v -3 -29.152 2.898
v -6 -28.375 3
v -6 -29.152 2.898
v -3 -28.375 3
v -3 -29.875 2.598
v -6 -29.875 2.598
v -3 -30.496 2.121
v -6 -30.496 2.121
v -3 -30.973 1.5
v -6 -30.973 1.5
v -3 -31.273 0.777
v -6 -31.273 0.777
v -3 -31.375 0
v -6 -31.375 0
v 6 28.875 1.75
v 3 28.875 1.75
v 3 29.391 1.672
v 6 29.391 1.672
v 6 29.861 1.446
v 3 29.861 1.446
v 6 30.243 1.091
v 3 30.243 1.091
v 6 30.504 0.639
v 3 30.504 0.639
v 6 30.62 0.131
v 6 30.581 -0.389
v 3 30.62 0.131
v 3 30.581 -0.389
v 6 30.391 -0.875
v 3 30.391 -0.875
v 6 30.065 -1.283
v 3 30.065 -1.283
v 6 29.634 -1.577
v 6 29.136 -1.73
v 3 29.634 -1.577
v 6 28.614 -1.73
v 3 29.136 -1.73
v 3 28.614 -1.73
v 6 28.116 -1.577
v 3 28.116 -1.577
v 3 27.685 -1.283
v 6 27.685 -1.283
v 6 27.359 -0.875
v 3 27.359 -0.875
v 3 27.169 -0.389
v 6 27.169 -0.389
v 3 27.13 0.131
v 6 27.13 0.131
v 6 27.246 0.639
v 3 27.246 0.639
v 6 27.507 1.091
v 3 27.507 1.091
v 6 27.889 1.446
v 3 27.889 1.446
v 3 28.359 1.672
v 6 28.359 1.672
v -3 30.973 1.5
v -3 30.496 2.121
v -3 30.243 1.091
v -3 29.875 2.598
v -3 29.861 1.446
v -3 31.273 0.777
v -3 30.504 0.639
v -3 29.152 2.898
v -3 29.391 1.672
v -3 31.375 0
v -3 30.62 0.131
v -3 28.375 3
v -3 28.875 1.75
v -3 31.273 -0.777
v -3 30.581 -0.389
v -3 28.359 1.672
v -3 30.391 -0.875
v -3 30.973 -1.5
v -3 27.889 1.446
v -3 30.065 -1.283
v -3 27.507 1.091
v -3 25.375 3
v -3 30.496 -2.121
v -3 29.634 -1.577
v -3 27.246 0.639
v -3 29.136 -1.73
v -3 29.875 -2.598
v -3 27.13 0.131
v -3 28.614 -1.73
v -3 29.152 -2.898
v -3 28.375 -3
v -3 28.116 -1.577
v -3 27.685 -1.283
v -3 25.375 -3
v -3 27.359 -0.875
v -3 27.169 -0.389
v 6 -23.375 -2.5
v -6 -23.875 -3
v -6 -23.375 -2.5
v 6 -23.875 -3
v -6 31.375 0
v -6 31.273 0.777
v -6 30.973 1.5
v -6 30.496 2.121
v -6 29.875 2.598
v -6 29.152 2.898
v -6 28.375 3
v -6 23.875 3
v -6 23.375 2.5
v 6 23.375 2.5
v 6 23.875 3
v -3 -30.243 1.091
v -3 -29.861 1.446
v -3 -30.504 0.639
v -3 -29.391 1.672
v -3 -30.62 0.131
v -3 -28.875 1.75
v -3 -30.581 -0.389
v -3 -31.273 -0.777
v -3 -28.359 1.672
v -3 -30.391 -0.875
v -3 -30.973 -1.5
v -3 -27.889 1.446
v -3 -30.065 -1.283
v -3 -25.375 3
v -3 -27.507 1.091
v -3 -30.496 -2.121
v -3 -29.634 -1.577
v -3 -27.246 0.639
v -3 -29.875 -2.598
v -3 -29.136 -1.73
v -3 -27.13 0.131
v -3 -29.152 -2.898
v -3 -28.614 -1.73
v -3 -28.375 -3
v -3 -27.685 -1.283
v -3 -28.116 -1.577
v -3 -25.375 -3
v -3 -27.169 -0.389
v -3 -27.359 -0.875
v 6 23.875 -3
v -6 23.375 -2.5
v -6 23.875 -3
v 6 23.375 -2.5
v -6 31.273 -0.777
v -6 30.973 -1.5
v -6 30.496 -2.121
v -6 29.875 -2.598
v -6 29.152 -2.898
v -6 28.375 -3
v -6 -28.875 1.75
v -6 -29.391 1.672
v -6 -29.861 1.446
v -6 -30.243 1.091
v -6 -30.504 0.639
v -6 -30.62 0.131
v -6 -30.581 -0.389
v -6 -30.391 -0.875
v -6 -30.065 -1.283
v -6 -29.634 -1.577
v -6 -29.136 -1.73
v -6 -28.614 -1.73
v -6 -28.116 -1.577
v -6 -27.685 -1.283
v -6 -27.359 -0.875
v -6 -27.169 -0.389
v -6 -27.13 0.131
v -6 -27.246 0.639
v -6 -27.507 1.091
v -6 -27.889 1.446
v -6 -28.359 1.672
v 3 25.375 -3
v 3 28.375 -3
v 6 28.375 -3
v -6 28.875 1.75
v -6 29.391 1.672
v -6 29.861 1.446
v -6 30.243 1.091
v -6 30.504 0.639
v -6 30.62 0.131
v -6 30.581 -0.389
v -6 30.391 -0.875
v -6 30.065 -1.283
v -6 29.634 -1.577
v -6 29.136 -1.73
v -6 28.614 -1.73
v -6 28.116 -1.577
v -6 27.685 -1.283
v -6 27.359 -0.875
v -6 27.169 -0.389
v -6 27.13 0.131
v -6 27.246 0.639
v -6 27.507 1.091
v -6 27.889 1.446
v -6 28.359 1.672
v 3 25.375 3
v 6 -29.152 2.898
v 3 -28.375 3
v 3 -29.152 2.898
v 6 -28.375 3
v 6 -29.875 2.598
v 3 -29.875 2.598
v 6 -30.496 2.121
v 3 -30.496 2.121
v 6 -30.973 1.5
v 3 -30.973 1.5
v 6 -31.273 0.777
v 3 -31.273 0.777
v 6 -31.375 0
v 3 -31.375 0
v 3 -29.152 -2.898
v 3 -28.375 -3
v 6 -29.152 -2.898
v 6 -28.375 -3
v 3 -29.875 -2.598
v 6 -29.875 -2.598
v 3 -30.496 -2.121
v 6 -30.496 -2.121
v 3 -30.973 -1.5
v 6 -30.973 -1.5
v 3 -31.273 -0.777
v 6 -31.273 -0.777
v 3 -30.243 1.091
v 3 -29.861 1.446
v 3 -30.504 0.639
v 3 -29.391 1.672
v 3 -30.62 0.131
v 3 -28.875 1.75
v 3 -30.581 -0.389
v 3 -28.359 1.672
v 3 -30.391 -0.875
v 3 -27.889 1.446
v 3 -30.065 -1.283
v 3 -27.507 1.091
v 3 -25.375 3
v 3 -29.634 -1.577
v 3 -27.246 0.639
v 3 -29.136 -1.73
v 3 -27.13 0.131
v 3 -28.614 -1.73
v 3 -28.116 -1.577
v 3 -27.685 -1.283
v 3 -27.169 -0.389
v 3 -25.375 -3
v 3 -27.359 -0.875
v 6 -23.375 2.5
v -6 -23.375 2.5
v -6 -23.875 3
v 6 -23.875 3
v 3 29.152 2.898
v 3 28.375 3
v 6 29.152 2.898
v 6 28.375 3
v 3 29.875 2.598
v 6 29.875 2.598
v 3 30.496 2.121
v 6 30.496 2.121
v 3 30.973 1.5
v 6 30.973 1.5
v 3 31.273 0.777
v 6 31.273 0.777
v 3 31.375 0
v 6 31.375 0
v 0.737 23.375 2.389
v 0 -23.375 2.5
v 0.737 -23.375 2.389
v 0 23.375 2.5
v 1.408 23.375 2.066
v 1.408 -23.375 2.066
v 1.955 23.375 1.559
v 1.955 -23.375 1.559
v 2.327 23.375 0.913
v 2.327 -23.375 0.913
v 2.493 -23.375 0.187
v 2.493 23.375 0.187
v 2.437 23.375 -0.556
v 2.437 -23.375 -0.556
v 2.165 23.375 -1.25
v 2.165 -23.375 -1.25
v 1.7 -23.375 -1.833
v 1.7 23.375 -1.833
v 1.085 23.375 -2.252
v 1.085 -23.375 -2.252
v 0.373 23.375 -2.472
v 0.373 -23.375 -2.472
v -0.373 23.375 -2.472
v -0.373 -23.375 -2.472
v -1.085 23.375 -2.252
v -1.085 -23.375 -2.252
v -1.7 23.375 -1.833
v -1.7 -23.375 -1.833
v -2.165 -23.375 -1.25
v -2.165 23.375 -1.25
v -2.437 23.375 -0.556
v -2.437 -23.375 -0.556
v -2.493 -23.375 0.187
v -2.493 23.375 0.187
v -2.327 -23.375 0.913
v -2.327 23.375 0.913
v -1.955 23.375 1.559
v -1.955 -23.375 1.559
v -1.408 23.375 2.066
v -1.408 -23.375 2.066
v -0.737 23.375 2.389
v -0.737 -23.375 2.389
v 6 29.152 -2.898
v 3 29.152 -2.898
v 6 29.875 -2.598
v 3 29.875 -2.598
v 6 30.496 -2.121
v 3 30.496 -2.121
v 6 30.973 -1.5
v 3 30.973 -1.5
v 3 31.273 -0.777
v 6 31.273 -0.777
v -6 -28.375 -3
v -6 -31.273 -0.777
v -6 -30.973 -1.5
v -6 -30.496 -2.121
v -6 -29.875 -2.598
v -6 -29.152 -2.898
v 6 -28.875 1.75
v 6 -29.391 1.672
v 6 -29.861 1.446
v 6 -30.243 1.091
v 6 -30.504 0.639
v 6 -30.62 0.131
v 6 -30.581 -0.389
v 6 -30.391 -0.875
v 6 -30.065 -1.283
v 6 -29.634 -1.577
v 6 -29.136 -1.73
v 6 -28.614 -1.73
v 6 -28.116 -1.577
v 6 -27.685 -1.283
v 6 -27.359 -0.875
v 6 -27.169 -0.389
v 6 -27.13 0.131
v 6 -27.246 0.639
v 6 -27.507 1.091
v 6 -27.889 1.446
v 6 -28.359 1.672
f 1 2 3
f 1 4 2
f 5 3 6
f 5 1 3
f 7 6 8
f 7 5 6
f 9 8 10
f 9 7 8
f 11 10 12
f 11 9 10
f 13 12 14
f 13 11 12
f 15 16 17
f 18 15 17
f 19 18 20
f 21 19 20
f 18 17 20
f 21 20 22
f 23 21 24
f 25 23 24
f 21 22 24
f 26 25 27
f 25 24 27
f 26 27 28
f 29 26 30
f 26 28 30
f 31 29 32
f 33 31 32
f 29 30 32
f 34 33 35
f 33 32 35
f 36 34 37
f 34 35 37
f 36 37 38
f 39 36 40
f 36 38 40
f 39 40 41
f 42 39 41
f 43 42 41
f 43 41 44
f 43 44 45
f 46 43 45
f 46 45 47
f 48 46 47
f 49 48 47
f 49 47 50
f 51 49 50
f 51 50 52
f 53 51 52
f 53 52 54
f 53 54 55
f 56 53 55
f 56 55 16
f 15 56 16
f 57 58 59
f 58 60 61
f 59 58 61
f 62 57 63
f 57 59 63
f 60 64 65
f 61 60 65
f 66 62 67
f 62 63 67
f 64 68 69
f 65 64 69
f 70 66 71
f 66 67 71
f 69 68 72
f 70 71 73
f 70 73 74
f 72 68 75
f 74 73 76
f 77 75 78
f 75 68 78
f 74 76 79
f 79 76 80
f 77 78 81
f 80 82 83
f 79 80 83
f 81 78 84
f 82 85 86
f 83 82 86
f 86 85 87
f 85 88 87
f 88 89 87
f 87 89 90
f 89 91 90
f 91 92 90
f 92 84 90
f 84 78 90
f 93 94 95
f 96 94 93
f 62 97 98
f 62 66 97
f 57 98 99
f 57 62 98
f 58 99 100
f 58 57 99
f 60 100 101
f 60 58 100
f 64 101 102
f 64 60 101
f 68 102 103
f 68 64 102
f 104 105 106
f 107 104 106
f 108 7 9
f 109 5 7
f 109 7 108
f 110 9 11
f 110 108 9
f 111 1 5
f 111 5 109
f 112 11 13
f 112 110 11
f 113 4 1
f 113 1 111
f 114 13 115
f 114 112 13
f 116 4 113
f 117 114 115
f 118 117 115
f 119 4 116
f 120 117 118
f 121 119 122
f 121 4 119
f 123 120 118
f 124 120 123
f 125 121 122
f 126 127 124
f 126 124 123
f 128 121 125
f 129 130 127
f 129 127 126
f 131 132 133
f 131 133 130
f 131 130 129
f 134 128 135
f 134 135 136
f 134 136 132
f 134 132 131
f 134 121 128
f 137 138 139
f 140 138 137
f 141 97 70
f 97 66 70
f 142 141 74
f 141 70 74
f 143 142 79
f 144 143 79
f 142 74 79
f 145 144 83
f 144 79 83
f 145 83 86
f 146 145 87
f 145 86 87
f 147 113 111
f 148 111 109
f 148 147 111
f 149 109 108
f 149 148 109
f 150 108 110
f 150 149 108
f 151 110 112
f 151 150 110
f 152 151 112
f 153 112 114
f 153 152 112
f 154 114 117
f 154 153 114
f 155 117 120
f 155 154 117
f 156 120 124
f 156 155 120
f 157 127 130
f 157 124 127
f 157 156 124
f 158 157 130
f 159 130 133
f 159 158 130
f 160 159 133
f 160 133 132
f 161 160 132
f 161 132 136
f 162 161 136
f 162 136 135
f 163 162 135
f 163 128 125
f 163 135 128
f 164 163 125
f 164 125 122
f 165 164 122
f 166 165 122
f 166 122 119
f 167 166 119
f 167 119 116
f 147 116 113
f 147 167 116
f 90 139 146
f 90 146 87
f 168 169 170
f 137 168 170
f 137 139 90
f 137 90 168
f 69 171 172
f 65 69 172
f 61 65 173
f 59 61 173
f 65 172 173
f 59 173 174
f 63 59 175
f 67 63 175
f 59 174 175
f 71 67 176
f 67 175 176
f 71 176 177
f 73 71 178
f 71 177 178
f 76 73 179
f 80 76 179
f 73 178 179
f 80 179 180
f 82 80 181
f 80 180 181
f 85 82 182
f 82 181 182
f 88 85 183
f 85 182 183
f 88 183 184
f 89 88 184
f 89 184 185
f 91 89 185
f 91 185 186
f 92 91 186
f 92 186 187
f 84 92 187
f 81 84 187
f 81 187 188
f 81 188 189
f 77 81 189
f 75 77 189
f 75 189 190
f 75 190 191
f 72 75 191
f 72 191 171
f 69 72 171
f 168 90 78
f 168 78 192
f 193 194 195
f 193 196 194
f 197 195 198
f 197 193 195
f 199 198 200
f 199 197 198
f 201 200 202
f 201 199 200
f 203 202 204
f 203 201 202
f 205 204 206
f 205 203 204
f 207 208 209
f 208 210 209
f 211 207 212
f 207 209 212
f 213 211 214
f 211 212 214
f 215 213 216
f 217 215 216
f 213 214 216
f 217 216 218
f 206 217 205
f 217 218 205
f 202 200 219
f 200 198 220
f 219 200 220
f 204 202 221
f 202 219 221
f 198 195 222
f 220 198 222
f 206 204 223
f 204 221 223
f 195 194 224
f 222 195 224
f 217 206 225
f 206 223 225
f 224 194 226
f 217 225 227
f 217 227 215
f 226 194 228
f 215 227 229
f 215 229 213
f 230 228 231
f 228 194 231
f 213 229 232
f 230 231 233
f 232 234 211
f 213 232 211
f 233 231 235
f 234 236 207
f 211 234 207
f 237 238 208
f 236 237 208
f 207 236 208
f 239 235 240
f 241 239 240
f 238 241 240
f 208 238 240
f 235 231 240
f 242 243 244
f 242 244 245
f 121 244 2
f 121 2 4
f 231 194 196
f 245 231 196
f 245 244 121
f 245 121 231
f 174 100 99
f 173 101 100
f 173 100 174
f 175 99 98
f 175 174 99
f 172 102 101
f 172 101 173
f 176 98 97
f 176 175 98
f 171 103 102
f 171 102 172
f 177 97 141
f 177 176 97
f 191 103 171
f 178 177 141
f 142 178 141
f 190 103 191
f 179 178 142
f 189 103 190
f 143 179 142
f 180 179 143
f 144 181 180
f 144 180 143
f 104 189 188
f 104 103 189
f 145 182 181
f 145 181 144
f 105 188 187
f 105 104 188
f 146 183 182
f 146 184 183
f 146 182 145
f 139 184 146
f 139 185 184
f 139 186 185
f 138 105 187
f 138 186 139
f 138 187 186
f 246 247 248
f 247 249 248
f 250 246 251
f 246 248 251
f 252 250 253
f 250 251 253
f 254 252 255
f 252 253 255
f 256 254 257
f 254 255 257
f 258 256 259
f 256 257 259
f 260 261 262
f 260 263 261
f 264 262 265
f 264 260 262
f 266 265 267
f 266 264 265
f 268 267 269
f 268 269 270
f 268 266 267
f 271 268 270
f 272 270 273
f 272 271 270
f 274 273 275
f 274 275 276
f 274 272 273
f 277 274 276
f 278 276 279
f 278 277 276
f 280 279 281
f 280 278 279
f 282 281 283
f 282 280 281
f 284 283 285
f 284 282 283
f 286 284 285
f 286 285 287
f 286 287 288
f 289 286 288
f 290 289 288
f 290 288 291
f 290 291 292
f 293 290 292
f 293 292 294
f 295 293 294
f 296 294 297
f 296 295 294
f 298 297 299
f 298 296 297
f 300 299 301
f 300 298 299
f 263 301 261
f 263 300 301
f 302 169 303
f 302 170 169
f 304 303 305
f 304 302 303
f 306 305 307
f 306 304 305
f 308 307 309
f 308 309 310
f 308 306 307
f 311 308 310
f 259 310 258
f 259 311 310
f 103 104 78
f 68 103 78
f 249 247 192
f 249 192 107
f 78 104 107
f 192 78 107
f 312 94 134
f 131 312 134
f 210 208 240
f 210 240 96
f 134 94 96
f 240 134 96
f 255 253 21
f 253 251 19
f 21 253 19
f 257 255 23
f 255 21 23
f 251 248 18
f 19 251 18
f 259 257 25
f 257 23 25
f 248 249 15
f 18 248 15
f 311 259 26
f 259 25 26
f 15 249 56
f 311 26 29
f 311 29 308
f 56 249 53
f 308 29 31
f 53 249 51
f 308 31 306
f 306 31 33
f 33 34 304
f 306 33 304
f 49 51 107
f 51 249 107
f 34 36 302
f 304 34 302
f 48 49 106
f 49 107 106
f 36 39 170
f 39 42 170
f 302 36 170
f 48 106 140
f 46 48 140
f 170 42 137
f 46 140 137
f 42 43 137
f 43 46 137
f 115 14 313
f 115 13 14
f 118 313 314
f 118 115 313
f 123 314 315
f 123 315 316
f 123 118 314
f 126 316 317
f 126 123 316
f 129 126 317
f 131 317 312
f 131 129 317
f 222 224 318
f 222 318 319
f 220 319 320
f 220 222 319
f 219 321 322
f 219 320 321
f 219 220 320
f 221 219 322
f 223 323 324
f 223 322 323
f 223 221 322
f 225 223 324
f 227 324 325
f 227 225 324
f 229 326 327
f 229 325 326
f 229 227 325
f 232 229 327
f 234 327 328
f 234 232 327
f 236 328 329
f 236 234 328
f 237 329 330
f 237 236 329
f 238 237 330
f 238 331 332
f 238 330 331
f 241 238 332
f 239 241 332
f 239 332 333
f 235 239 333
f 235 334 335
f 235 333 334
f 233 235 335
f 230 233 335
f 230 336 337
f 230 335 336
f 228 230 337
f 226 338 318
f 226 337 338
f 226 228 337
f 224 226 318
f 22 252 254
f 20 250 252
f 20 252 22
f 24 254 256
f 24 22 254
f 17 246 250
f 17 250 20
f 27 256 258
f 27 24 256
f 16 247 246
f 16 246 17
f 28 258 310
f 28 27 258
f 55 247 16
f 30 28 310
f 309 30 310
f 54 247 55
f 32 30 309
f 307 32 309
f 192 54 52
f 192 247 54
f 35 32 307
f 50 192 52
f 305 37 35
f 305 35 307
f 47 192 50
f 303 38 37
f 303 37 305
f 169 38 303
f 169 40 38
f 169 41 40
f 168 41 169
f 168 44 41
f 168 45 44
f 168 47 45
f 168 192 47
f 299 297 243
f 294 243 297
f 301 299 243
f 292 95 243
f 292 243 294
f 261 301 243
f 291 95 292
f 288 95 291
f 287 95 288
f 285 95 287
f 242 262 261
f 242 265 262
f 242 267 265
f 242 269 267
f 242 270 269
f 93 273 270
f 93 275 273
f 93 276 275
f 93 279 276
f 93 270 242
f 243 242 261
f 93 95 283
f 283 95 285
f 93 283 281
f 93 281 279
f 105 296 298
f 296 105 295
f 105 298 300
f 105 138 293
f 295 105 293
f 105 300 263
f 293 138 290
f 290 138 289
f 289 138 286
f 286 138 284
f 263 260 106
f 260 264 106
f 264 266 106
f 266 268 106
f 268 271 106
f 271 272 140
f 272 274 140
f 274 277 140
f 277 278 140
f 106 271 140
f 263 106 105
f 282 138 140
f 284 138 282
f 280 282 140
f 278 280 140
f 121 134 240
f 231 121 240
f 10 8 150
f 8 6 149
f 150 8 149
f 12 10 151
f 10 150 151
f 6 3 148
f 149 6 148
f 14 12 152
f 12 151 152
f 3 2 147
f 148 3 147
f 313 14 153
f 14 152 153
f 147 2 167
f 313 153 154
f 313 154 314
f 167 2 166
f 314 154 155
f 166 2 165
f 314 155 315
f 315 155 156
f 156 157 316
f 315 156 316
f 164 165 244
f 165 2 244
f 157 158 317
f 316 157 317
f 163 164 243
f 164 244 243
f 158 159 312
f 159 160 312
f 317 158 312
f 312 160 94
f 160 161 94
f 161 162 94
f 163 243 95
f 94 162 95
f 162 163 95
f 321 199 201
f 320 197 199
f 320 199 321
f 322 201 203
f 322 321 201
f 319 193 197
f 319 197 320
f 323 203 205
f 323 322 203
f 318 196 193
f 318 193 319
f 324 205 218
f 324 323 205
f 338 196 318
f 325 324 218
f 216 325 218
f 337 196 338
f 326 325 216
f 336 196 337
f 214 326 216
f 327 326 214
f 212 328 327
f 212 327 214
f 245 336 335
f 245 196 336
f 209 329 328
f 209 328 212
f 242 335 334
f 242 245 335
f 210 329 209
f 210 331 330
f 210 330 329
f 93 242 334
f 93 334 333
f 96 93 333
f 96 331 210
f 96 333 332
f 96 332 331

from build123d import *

# Parameters (mm, degrees)
SKETCH1_R                = 2.5
BOSS_EXTRUDE1_DEPTH      = 23.375
SKETCH2_W                = 12
SKETCH2_H                = 6
BOSS_EXTRUDE2_DEPTH      = 2
SKETCH3_W                = 3
SKETCH3_H                = 6
BOSS_EXTRUDE3_DEPTH      = 6
SKETCH4_R                = 1.75
CUT_EXTRUDE1_DEPTH       = 34.725222386
FILLET1_R                = 3
CHAMFER2_SIZE            = 0.5
FILLET1_OF_MIRROR1_R     = 3
CHAMFER2_OF_MIRROR1_SIZE = 0.5


with BuildPart() as part:
    # Sketch1 → Boss-Extrude1 (new, symmetric)
    with BuildSketch(Plane(origin=(0, 0, 0), x_dir=(1, 0, 0), z_dir=(0, 1, 0))):
        with Locations(Location((0, 0, 0), (0, 0, 270))):
            Circle(SKETCH1_R)
    extrude(amount=BOSS_EXTRUDE1_DEPTH, both=True)

    # Sketch2 → Boss-Extrude2 (add)
    with BuildSketch(Plane(origin=(0, 23.375, 0), x_dir=(1, 0, 0), z_dir=(0, 1, 0))):
        Rectangle(SKETCH2_W, SKETCH2_H)
    boss_extrude2 = extrude(amount=BOSS_EXTRUDE2_DEPTH)

    # Sketch3 → Boss-Extrude3 (add)
    with BuildSketch(Plane(origin=(0, 25.375, 0), x_dir=(1, 0, 0), z_dir=(0, 1, 0))):
        with Locations((-4.5, 0)):
            Rectangle(SKETCH3_W, SKETCH3_H)
        with Locations((4.5, 0)):
            Rectangle(SKETCH3_W, SKETCH3_H)
    boss_extrude3 = extrude(amount=BOSS_EXTRUDE3_DEPTH)

    # Sketch4 → Cut-Extrude1 (cut, through all)
    with BuildSketch(Plane.ZY.offset(6)):
        with Locations((0, 28.875)):
            Circle(SKETCH4_R)
    cut_extrude1 = extrude(amount=-CUT_EXTRUDE1_DEPTH, mode=Mode.SUBTRACT)

    # Fillet1
    fillet1_edges = [part.edges().sort_by_distance(p)[0] for p in [
        (4.5, 31.375, 3),
        (4.5, 31.375, -3),
        (-4.5, 31.375, 3),
        (-4.5, 31.375, -3),
    ]]
    fillet(fillet1_edges, radius=FILLET1_R - 0.0001)  # a hair under: the kernel refuses the full size

    # Chamfer2
    chamfer2_edges = [part.edges().sort_by_distance(p)[0] for p in [
        (0, 23.375, -3),
        (0, 23.375, 3),
    ]]
    chamfer(chamfer2_edges, length=CHAMFER2_SIZE - 0.0001)  # a hair under: the kernel refuses the full size

    # Mirror1: Boss-Extrude2, Boss-Extrude3, Cut-Extrude1 across plane
    add(boss_extrude2.mirror(Plane.ZX))
    add(boss_extrude3.mirror(Plane.ZX))
    add(cut_extrude1.mirror(Plane.ZX), mode=Mode.SUBTRACT)

    # Fillet1 of Mirror1
    fillet1_of_mirror1_edges = [part.edges().sort_by_distance(p)[0] for p in [
        (4.5, -31.375, 3),
        (4.5, -31.375, -3),
        (-4.5, -31.375, 3),
        (-4.5, -31.375, -3),
    ]]
    fillet(fillet1_of_mirror1_edges, radius=FILLET1_OF_MIRROR1_R - 0.0001)  # a hair under: the kernel refuses the full size

    # Chamfer2 of Mirror1
    chamfer2_of_mirror1_edges = [part.edges().sort_by_distance(p)[0] for p in [
        (0, -23.375, -3),
        (0, -23.375, 3),
    ]]
    chamfer(chamfer2_of_mirror1_edges, length=CHAMFER2_OF_MIRROR1_SIZE - 0.0001)  # a hair under: the kernel refuses the full size


solid = part.part
